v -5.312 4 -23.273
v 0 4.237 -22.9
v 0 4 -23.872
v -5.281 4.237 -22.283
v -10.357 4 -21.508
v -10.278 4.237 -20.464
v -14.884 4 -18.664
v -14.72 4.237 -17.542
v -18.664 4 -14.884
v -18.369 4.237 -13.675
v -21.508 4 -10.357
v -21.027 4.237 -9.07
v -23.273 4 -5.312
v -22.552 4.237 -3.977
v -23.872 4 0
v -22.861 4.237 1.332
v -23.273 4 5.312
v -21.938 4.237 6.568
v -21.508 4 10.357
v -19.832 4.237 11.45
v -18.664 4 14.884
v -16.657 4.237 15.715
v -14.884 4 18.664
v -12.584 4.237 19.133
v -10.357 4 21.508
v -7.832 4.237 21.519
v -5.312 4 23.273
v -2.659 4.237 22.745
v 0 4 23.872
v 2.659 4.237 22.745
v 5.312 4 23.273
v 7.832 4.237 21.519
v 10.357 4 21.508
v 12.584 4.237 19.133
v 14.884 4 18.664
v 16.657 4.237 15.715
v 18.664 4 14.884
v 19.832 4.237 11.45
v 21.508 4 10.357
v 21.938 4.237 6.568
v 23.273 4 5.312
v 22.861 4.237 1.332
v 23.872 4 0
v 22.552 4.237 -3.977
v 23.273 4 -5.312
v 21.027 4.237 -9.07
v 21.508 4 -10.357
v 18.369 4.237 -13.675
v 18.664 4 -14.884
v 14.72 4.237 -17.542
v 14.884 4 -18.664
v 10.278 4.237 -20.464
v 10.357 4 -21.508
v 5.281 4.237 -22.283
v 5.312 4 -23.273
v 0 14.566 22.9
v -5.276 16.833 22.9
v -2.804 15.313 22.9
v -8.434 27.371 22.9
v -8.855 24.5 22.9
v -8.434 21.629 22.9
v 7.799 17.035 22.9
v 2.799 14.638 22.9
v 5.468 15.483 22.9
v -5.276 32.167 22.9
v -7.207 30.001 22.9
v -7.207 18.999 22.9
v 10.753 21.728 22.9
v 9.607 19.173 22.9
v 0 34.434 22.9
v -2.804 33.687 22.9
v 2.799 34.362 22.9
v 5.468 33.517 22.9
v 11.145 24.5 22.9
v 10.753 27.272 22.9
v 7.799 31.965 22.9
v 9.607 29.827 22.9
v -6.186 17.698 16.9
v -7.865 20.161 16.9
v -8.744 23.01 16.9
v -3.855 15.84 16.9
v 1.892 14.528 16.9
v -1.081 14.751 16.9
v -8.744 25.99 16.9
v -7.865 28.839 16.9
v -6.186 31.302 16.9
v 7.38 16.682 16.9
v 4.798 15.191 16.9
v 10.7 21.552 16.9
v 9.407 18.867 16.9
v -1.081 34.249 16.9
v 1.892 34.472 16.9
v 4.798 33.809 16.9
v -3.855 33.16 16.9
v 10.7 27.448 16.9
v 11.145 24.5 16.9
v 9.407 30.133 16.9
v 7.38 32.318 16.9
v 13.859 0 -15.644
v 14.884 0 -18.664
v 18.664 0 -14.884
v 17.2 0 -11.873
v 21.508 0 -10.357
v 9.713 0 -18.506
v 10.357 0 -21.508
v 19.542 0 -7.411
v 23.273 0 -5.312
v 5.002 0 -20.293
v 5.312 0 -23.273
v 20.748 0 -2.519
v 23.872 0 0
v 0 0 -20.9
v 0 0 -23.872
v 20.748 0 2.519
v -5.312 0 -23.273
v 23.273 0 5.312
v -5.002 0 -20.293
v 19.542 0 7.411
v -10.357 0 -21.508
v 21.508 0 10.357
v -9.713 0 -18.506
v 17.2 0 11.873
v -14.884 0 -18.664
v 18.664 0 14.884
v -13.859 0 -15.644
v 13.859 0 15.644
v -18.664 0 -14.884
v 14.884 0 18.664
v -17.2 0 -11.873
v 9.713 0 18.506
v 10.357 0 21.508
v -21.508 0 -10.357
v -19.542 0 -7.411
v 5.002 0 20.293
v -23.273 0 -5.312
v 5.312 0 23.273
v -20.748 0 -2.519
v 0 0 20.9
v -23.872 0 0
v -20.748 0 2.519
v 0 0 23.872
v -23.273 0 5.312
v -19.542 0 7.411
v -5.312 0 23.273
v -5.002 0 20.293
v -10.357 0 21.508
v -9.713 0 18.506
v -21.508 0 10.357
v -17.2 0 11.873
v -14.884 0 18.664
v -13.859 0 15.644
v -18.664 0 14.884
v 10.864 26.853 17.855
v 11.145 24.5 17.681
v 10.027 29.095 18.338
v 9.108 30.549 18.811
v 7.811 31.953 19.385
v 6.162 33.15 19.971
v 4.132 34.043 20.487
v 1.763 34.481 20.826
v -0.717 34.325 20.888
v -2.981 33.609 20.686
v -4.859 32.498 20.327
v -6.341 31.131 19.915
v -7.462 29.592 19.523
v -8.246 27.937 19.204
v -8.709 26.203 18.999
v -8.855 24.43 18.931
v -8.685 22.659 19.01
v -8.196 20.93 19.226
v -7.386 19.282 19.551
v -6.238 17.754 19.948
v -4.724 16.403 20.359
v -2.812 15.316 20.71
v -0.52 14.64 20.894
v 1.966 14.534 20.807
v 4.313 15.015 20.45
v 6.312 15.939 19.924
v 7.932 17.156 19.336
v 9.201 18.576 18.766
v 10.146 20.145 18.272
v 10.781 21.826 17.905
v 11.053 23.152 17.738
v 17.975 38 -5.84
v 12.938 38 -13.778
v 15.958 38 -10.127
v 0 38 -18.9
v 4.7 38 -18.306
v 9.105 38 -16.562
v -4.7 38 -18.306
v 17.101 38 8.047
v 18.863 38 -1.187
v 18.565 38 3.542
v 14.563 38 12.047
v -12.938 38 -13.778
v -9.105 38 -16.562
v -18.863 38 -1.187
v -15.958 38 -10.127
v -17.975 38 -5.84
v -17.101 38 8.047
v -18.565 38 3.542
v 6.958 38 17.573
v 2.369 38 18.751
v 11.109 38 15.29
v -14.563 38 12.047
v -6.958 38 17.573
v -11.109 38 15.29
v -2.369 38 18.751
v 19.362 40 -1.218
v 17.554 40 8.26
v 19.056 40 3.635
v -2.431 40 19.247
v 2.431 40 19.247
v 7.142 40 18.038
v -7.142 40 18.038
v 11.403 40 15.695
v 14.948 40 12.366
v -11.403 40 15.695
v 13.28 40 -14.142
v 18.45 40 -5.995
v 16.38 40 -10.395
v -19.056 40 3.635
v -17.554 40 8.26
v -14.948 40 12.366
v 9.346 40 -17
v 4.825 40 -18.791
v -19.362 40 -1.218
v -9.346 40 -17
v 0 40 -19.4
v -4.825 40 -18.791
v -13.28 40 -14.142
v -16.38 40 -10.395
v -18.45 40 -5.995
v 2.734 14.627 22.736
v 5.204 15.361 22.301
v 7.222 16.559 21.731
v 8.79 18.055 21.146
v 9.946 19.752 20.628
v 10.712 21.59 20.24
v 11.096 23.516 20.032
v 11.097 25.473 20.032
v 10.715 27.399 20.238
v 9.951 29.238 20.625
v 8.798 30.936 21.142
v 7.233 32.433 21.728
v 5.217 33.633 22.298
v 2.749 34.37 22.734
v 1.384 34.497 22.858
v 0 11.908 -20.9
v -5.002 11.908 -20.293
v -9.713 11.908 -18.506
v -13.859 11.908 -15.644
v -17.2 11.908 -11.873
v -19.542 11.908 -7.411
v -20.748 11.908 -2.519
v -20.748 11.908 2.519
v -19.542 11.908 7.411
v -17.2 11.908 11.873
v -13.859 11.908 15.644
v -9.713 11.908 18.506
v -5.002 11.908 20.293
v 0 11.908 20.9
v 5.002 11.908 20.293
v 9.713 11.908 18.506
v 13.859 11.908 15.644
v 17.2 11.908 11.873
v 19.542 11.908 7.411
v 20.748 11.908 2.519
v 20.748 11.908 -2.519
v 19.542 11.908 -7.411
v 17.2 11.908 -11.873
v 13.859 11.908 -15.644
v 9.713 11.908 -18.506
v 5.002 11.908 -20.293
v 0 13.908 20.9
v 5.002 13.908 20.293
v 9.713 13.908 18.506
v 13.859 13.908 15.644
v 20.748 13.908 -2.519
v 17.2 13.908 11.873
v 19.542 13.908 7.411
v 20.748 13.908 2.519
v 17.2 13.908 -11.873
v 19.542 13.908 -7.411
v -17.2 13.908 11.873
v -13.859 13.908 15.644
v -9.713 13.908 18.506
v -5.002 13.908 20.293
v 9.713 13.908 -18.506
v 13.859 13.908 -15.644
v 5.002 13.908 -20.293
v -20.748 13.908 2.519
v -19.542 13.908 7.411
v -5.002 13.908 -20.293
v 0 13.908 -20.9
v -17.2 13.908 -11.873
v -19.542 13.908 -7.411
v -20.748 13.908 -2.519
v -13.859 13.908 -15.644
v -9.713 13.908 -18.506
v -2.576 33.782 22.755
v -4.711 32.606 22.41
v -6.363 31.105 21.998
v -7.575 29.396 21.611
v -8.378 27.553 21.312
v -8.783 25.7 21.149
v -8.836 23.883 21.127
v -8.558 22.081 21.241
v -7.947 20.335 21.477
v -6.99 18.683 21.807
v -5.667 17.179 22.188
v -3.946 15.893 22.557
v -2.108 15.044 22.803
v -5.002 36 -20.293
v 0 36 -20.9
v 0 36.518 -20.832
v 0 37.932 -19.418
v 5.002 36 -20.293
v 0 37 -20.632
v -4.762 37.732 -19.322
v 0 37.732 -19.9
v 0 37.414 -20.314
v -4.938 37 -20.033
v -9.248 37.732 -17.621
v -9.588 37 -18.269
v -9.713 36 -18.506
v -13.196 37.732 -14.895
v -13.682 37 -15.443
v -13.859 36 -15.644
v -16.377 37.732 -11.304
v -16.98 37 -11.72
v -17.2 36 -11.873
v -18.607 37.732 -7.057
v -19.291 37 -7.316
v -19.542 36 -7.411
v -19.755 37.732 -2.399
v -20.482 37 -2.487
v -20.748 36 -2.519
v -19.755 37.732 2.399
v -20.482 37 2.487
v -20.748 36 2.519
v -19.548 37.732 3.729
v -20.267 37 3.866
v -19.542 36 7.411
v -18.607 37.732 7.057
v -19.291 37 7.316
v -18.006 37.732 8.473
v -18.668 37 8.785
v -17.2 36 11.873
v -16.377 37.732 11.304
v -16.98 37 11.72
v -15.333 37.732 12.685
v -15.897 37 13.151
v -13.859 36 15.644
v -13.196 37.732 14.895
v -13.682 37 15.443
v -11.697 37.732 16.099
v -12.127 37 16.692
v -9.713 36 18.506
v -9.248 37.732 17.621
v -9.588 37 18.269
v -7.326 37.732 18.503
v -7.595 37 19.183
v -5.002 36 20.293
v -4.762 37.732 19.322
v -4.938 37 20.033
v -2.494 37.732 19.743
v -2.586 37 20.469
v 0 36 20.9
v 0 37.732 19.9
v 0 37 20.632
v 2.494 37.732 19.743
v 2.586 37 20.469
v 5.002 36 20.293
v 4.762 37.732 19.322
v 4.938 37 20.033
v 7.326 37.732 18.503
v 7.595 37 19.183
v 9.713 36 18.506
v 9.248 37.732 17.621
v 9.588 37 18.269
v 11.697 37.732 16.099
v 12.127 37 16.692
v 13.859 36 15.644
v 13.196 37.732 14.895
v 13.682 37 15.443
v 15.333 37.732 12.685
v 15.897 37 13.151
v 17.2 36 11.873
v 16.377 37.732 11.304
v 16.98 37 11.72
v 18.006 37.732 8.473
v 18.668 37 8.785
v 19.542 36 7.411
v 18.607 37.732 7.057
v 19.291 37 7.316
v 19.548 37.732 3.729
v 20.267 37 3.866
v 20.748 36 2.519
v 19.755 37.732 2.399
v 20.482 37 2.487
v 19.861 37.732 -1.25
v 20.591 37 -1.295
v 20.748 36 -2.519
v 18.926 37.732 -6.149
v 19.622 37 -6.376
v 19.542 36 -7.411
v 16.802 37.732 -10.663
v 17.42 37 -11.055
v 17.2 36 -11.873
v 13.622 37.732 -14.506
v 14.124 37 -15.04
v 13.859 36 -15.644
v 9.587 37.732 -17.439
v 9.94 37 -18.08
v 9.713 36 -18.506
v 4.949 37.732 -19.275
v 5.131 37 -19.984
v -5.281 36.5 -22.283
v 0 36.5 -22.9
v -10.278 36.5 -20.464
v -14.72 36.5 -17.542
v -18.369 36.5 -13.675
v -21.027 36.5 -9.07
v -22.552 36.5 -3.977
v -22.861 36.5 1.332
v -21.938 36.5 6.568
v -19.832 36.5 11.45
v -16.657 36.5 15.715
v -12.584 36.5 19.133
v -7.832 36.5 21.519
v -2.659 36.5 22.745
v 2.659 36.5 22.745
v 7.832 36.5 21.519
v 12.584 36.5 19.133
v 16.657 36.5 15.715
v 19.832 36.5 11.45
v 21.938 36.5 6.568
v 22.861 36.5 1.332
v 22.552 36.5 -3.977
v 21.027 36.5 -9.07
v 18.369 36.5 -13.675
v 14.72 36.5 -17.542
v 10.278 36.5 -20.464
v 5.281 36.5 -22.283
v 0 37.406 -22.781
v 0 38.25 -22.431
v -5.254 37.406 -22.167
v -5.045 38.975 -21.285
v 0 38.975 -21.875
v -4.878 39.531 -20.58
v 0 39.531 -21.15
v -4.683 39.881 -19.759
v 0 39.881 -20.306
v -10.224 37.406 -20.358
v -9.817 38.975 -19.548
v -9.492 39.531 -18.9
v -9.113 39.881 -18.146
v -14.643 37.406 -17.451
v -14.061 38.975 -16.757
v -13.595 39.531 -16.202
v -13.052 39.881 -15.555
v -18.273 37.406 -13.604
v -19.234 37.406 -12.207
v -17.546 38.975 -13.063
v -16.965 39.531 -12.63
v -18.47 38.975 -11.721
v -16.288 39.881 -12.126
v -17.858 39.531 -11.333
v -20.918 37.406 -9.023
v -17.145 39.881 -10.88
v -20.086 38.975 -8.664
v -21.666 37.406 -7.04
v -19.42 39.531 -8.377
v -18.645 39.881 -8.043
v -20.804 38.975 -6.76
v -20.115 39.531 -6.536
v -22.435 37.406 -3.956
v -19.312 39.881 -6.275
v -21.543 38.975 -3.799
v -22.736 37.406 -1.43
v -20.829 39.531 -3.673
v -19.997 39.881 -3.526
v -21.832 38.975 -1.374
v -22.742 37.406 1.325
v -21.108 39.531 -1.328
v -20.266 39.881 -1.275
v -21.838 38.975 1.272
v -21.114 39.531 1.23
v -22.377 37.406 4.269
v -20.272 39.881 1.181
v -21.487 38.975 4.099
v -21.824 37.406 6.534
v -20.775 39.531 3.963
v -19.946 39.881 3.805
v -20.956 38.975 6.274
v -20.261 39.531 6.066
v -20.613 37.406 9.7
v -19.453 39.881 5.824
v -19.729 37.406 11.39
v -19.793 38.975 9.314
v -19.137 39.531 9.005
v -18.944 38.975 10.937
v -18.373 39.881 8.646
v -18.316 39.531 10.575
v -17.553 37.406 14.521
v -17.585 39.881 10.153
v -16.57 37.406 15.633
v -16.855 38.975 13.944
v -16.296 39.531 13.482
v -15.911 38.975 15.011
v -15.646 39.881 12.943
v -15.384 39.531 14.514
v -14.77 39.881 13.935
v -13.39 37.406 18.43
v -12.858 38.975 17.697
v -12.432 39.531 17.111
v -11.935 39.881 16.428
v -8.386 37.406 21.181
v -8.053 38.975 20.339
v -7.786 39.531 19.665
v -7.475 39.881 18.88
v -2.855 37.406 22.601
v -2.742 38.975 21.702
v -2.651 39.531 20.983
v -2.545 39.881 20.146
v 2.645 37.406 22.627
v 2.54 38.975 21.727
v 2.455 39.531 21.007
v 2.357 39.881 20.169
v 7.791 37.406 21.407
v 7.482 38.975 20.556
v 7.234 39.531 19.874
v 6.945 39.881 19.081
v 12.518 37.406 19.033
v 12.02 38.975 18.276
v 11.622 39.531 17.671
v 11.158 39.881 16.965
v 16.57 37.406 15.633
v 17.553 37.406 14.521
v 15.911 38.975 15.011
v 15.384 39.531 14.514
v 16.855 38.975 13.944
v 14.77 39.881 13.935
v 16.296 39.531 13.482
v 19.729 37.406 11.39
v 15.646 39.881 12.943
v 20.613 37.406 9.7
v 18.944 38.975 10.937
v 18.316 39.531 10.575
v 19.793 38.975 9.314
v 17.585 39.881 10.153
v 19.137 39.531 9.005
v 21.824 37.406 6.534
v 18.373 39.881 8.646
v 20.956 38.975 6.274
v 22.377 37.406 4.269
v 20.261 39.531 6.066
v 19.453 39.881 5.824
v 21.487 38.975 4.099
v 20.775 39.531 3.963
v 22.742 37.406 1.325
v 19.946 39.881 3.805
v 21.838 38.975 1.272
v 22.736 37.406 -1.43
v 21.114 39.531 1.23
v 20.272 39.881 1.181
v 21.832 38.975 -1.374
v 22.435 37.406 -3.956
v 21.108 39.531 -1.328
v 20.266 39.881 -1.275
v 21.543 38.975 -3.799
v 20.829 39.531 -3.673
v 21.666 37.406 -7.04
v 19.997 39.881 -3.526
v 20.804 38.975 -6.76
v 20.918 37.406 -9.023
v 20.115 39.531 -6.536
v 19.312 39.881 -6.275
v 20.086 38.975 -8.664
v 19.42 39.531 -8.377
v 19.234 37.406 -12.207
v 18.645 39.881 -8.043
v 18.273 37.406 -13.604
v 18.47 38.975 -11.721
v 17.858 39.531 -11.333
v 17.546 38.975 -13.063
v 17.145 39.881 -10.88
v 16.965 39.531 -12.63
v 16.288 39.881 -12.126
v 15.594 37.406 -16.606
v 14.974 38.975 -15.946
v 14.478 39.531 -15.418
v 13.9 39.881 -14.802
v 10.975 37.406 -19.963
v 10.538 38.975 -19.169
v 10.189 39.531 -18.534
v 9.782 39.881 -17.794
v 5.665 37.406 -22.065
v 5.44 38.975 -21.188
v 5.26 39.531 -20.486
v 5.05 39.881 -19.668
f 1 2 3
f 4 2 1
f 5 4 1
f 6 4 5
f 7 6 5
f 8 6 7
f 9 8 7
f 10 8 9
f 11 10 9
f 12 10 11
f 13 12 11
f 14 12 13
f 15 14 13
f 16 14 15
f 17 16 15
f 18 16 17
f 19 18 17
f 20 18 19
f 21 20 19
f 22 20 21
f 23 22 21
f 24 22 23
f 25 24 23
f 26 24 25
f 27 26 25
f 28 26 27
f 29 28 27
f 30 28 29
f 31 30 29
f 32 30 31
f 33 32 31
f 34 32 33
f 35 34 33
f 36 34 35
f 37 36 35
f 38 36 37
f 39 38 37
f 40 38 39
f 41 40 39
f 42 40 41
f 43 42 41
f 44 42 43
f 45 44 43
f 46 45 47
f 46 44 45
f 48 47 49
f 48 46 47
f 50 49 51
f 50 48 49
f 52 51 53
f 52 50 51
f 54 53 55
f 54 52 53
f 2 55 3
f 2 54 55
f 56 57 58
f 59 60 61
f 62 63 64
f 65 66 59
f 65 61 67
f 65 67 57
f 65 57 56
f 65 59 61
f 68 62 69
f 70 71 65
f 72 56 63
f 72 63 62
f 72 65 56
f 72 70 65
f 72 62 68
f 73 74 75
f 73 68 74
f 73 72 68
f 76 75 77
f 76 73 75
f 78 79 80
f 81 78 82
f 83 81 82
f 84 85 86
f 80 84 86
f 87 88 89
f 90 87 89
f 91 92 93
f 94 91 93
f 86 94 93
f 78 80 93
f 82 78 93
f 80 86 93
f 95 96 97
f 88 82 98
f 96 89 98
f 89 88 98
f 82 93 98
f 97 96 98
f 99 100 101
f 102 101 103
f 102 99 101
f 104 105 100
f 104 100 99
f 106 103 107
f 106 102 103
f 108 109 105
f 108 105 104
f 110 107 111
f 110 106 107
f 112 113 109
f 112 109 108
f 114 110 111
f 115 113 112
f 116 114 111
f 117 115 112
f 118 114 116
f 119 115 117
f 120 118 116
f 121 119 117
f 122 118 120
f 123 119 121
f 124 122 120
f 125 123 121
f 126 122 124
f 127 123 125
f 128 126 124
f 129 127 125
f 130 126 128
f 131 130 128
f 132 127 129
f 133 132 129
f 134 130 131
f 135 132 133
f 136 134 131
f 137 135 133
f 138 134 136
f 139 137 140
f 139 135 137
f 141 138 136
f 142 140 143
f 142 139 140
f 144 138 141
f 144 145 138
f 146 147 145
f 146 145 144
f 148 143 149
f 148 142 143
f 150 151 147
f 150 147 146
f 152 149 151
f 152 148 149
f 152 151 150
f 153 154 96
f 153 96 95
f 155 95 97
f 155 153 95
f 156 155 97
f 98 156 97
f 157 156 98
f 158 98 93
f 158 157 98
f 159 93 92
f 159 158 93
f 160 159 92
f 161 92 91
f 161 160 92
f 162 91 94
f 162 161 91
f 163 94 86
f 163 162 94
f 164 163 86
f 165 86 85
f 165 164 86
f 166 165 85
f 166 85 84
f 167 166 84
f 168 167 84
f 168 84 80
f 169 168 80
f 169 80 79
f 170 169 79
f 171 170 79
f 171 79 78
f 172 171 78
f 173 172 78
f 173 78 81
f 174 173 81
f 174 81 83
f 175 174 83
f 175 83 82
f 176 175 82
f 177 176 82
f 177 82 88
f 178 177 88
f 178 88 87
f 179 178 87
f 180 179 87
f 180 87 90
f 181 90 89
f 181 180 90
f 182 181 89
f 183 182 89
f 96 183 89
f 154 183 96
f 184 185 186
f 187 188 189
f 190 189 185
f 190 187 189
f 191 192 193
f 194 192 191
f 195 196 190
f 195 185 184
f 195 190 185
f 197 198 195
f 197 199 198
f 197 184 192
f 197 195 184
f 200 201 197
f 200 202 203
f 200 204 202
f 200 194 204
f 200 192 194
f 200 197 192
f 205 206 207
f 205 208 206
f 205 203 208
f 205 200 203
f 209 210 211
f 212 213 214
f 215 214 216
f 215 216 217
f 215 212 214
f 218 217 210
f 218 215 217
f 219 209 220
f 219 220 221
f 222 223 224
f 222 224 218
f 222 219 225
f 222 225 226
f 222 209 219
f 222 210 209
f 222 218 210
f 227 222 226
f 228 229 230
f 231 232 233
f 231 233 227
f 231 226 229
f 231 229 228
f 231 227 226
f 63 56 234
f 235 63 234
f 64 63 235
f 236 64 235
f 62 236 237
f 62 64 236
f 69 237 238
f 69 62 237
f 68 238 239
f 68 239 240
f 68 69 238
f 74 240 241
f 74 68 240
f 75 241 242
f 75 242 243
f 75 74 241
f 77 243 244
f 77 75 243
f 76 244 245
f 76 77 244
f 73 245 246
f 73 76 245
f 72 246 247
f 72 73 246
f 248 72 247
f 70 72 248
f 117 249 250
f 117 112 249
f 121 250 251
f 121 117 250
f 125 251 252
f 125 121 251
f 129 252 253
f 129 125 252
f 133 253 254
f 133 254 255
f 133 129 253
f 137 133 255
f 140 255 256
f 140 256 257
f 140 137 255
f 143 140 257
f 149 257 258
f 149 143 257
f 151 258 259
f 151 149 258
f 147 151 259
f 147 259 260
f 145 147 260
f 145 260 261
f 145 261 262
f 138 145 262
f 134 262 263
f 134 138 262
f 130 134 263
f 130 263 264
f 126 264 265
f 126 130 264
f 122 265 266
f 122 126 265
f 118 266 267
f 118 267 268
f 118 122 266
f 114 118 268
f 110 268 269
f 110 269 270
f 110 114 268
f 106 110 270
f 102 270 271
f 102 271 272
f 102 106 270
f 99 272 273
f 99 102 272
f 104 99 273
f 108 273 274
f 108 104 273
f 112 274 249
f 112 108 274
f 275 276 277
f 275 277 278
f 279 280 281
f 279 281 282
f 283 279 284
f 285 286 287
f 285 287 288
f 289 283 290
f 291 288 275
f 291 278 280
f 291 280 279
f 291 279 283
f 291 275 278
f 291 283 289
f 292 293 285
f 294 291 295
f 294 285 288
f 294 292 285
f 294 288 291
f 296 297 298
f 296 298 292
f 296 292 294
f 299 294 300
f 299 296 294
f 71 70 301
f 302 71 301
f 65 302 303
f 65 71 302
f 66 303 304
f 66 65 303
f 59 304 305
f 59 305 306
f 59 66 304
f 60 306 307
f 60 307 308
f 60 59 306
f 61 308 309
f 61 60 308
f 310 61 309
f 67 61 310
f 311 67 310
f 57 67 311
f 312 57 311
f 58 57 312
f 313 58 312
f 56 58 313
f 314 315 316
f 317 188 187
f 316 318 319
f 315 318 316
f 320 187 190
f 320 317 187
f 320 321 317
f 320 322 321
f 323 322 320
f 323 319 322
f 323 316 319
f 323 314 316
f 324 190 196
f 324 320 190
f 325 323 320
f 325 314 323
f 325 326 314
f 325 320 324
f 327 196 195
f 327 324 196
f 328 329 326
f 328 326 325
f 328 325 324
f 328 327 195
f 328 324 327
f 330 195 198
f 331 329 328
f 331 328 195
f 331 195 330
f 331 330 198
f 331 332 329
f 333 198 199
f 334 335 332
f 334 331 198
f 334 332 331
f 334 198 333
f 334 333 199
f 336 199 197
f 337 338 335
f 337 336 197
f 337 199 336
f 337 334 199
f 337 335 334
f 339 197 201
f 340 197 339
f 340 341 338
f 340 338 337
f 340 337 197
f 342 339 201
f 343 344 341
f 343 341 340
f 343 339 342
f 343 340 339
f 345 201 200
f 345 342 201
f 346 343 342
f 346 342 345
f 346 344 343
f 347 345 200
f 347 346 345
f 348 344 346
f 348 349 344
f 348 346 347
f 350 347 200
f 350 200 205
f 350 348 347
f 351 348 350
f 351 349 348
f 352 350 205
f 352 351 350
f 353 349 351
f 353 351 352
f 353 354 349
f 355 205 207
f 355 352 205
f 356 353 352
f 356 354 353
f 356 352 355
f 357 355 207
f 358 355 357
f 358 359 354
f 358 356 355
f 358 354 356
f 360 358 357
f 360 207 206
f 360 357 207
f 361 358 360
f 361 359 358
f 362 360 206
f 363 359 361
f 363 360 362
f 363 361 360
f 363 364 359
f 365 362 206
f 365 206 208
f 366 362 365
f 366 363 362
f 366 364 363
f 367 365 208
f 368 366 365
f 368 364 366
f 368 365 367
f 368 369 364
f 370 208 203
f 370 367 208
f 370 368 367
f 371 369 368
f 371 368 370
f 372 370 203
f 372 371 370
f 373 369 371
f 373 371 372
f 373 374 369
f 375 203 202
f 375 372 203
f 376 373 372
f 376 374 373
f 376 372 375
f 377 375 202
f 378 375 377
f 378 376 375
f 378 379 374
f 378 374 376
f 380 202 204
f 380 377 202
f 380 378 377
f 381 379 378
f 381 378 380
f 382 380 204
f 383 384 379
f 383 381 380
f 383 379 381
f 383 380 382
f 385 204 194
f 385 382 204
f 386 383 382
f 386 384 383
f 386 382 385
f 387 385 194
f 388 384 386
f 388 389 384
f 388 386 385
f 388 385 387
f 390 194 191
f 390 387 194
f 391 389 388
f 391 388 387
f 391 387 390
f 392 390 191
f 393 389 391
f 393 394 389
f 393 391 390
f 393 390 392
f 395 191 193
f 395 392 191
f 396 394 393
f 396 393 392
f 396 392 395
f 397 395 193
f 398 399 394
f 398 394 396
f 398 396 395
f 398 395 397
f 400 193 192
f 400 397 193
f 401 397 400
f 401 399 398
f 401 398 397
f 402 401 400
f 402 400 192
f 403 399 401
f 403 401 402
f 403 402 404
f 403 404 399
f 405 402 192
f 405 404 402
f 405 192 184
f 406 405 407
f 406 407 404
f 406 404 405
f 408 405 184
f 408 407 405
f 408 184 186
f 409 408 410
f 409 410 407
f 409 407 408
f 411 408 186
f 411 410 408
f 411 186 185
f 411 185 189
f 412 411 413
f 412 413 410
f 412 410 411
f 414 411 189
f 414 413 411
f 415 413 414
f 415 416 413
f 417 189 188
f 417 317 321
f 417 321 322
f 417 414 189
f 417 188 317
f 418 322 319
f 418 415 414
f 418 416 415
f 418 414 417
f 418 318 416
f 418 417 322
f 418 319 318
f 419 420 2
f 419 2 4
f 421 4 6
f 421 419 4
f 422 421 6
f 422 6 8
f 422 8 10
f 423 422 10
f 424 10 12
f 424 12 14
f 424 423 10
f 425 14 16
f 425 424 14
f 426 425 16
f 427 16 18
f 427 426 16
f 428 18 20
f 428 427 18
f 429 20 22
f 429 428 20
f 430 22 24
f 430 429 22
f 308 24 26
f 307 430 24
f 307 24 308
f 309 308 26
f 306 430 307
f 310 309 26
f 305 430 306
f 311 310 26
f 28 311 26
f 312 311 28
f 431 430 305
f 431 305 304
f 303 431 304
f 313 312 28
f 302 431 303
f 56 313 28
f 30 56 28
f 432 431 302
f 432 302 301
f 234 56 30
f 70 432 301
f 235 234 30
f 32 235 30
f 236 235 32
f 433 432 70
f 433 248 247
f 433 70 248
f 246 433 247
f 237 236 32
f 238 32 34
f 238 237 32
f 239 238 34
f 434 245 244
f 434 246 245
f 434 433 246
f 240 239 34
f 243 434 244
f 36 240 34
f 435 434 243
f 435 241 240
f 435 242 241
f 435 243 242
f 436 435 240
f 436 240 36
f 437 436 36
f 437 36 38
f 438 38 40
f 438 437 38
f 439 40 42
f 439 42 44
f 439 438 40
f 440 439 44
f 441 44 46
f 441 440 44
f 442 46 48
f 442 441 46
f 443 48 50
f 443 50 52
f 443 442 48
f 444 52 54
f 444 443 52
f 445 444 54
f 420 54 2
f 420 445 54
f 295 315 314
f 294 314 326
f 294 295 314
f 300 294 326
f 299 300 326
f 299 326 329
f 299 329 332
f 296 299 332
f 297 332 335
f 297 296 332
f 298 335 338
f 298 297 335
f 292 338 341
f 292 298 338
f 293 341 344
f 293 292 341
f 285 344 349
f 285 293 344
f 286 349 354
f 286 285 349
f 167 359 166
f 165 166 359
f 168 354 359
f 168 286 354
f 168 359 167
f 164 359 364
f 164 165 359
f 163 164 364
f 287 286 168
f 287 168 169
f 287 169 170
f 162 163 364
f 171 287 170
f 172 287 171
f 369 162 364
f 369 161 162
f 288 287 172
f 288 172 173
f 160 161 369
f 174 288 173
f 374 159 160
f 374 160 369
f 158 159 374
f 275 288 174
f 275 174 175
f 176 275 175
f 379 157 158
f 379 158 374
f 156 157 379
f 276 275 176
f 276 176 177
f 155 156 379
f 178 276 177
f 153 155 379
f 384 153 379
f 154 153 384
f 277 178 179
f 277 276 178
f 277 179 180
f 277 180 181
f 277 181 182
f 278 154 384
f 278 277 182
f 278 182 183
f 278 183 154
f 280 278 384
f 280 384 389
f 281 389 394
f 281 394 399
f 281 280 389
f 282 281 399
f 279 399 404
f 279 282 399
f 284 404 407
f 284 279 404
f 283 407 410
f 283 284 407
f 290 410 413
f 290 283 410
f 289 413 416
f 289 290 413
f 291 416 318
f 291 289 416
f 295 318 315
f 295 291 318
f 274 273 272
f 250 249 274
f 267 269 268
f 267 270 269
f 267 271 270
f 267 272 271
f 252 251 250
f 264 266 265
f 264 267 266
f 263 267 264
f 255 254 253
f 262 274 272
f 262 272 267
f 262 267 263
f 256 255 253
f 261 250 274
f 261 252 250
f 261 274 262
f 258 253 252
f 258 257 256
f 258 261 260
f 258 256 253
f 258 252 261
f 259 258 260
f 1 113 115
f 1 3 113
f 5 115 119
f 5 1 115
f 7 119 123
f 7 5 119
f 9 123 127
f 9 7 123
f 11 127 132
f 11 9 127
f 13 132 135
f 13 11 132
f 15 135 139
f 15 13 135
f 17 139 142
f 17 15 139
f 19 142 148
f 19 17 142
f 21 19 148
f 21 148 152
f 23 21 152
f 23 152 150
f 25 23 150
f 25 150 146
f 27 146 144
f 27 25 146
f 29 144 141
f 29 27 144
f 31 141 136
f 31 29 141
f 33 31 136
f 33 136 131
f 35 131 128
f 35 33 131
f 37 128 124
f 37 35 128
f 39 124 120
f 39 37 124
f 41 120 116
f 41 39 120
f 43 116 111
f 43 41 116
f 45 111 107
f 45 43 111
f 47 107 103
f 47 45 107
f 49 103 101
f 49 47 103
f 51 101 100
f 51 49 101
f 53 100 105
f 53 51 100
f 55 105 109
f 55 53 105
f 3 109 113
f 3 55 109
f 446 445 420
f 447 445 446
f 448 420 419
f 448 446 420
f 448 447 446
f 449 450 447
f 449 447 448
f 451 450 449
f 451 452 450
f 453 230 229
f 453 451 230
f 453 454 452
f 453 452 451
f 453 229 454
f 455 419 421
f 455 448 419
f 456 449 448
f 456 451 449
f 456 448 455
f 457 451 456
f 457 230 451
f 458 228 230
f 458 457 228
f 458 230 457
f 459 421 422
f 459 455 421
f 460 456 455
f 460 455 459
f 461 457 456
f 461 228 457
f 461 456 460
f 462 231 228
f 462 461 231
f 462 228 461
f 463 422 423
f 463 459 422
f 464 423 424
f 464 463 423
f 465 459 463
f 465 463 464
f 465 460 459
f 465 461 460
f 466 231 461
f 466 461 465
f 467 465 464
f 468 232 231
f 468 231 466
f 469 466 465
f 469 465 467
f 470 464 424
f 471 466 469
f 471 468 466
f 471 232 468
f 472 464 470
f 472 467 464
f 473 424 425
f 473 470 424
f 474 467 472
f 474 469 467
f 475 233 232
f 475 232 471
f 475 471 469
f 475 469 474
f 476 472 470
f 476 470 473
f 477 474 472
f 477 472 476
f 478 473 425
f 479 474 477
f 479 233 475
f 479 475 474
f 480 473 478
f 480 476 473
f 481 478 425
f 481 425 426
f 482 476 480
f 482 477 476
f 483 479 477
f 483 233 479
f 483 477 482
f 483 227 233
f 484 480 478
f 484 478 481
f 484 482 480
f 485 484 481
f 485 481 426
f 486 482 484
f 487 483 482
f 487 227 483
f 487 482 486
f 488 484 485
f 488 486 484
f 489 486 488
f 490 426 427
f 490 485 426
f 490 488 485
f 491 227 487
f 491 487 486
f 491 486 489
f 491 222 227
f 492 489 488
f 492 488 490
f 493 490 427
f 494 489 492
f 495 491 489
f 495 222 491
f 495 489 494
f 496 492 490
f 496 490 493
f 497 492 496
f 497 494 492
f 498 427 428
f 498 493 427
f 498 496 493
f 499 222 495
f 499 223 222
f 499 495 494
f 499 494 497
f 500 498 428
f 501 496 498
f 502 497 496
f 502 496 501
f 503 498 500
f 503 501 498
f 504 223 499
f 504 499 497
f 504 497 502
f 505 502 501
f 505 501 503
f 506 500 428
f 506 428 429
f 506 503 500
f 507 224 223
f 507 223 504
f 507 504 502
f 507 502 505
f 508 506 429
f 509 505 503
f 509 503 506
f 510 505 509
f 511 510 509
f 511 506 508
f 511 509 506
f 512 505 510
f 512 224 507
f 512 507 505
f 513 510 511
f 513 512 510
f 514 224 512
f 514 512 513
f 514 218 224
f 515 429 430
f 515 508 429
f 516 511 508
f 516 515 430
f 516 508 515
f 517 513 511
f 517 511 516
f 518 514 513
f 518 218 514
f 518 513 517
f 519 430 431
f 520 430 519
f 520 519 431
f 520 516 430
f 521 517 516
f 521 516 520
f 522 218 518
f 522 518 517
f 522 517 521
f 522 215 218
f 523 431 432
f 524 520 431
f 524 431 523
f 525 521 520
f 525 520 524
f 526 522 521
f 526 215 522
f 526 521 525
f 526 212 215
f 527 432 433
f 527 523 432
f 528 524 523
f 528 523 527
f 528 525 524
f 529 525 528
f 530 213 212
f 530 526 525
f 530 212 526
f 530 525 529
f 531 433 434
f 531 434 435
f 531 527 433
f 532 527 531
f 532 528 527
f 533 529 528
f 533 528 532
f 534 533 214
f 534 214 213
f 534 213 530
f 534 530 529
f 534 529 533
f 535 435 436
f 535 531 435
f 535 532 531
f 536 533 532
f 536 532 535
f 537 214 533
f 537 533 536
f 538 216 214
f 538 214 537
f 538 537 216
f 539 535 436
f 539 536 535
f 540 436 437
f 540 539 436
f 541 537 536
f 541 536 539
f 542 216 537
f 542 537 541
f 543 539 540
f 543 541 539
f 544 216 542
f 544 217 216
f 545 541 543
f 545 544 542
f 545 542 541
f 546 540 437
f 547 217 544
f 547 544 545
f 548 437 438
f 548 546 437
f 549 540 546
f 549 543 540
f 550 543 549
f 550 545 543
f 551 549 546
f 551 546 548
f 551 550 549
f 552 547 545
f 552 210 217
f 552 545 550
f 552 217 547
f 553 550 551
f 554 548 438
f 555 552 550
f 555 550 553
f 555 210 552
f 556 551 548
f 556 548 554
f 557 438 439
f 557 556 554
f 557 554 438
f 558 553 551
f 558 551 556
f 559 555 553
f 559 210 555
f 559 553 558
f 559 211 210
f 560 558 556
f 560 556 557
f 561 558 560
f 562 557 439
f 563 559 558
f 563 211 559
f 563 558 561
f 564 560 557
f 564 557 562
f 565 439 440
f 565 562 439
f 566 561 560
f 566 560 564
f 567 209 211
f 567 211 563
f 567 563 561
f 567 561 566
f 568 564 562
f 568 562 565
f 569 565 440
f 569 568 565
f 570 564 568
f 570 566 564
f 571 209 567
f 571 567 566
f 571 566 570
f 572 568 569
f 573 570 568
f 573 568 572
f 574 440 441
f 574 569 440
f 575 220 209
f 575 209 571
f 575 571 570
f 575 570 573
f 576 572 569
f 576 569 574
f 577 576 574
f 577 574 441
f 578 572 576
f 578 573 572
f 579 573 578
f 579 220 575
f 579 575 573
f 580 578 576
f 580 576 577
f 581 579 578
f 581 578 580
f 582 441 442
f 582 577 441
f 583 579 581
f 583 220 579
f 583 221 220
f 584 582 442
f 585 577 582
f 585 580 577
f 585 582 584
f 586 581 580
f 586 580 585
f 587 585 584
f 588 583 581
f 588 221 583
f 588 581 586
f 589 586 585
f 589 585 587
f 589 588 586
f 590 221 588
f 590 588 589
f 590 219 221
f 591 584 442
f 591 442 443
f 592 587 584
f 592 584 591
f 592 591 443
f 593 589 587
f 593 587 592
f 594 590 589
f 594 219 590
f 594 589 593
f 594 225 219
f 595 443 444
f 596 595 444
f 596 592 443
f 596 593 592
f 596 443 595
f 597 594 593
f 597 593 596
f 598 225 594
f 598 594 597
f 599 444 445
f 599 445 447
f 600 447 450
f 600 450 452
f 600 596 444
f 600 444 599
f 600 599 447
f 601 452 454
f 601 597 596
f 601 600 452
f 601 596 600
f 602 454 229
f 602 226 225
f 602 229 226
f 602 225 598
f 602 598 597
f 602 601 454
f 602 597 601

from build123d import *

# Parameters (mm, degrees)
SKETCH4_R           = 10
BOSS_EXTRUDE2_DEPTH = 6


with BuildPart() as part:
    # Sketch1 → Revolve1 (revolve)
    with BuildSketch(Plane.XY, mode=Mode.PRIVATE) as revolve1_sk:
        with BuildLine():
            Line((20.9, 0), (23.871591838, 0))
            Line((23.871591838, 0), (23.871591838, 4))
            Line((23.871591838, 4), (22.9, 4.236662843))
            Line((22.9, 4.236662843), (22.9, 36.5))
            ThreePointArc((22.9, 36.5), (21.874873734, 38.974873734), (19.4, 40))
            Line((19.4, 40), (0, 40))
            Line((0, 40), (0, 38))
            Line((0, 38), (18.9, 38))
            ThreePointArc((18.9, 38), (20.314213562, 37.414213562), (20.9, 36))
            Line((20.9, 36), (20.9, 13.908178136))
            Line((20.9, 13.908178136), (0, 13.908178136))
            Line((0, 13.908178136), (0, 11.908178136))
            Line((0, 11.908178136), (20.9, 11.908178136))
            Line((20.9, 11.908178136), (20.9, 0))
        make_face()
    revolve(revolve1_sk.sketch.rotate(Axis((0, -0.724089275, 0), (0, 1, 0)), 90), axis=Axis((0, -0.724089275, 0), (0, 1, 0)))

    # Sketch4 → Boss-Extrude2 (add)
    with BuildSketch(Plane.XY.offset(22.9)):
        with Locations((1.144629865, 24.5)):
            Circle(SKETCH4_R)
    extrude(amount=-BOSS_EXTRUDE2_DEPTH)


solid = part.part
